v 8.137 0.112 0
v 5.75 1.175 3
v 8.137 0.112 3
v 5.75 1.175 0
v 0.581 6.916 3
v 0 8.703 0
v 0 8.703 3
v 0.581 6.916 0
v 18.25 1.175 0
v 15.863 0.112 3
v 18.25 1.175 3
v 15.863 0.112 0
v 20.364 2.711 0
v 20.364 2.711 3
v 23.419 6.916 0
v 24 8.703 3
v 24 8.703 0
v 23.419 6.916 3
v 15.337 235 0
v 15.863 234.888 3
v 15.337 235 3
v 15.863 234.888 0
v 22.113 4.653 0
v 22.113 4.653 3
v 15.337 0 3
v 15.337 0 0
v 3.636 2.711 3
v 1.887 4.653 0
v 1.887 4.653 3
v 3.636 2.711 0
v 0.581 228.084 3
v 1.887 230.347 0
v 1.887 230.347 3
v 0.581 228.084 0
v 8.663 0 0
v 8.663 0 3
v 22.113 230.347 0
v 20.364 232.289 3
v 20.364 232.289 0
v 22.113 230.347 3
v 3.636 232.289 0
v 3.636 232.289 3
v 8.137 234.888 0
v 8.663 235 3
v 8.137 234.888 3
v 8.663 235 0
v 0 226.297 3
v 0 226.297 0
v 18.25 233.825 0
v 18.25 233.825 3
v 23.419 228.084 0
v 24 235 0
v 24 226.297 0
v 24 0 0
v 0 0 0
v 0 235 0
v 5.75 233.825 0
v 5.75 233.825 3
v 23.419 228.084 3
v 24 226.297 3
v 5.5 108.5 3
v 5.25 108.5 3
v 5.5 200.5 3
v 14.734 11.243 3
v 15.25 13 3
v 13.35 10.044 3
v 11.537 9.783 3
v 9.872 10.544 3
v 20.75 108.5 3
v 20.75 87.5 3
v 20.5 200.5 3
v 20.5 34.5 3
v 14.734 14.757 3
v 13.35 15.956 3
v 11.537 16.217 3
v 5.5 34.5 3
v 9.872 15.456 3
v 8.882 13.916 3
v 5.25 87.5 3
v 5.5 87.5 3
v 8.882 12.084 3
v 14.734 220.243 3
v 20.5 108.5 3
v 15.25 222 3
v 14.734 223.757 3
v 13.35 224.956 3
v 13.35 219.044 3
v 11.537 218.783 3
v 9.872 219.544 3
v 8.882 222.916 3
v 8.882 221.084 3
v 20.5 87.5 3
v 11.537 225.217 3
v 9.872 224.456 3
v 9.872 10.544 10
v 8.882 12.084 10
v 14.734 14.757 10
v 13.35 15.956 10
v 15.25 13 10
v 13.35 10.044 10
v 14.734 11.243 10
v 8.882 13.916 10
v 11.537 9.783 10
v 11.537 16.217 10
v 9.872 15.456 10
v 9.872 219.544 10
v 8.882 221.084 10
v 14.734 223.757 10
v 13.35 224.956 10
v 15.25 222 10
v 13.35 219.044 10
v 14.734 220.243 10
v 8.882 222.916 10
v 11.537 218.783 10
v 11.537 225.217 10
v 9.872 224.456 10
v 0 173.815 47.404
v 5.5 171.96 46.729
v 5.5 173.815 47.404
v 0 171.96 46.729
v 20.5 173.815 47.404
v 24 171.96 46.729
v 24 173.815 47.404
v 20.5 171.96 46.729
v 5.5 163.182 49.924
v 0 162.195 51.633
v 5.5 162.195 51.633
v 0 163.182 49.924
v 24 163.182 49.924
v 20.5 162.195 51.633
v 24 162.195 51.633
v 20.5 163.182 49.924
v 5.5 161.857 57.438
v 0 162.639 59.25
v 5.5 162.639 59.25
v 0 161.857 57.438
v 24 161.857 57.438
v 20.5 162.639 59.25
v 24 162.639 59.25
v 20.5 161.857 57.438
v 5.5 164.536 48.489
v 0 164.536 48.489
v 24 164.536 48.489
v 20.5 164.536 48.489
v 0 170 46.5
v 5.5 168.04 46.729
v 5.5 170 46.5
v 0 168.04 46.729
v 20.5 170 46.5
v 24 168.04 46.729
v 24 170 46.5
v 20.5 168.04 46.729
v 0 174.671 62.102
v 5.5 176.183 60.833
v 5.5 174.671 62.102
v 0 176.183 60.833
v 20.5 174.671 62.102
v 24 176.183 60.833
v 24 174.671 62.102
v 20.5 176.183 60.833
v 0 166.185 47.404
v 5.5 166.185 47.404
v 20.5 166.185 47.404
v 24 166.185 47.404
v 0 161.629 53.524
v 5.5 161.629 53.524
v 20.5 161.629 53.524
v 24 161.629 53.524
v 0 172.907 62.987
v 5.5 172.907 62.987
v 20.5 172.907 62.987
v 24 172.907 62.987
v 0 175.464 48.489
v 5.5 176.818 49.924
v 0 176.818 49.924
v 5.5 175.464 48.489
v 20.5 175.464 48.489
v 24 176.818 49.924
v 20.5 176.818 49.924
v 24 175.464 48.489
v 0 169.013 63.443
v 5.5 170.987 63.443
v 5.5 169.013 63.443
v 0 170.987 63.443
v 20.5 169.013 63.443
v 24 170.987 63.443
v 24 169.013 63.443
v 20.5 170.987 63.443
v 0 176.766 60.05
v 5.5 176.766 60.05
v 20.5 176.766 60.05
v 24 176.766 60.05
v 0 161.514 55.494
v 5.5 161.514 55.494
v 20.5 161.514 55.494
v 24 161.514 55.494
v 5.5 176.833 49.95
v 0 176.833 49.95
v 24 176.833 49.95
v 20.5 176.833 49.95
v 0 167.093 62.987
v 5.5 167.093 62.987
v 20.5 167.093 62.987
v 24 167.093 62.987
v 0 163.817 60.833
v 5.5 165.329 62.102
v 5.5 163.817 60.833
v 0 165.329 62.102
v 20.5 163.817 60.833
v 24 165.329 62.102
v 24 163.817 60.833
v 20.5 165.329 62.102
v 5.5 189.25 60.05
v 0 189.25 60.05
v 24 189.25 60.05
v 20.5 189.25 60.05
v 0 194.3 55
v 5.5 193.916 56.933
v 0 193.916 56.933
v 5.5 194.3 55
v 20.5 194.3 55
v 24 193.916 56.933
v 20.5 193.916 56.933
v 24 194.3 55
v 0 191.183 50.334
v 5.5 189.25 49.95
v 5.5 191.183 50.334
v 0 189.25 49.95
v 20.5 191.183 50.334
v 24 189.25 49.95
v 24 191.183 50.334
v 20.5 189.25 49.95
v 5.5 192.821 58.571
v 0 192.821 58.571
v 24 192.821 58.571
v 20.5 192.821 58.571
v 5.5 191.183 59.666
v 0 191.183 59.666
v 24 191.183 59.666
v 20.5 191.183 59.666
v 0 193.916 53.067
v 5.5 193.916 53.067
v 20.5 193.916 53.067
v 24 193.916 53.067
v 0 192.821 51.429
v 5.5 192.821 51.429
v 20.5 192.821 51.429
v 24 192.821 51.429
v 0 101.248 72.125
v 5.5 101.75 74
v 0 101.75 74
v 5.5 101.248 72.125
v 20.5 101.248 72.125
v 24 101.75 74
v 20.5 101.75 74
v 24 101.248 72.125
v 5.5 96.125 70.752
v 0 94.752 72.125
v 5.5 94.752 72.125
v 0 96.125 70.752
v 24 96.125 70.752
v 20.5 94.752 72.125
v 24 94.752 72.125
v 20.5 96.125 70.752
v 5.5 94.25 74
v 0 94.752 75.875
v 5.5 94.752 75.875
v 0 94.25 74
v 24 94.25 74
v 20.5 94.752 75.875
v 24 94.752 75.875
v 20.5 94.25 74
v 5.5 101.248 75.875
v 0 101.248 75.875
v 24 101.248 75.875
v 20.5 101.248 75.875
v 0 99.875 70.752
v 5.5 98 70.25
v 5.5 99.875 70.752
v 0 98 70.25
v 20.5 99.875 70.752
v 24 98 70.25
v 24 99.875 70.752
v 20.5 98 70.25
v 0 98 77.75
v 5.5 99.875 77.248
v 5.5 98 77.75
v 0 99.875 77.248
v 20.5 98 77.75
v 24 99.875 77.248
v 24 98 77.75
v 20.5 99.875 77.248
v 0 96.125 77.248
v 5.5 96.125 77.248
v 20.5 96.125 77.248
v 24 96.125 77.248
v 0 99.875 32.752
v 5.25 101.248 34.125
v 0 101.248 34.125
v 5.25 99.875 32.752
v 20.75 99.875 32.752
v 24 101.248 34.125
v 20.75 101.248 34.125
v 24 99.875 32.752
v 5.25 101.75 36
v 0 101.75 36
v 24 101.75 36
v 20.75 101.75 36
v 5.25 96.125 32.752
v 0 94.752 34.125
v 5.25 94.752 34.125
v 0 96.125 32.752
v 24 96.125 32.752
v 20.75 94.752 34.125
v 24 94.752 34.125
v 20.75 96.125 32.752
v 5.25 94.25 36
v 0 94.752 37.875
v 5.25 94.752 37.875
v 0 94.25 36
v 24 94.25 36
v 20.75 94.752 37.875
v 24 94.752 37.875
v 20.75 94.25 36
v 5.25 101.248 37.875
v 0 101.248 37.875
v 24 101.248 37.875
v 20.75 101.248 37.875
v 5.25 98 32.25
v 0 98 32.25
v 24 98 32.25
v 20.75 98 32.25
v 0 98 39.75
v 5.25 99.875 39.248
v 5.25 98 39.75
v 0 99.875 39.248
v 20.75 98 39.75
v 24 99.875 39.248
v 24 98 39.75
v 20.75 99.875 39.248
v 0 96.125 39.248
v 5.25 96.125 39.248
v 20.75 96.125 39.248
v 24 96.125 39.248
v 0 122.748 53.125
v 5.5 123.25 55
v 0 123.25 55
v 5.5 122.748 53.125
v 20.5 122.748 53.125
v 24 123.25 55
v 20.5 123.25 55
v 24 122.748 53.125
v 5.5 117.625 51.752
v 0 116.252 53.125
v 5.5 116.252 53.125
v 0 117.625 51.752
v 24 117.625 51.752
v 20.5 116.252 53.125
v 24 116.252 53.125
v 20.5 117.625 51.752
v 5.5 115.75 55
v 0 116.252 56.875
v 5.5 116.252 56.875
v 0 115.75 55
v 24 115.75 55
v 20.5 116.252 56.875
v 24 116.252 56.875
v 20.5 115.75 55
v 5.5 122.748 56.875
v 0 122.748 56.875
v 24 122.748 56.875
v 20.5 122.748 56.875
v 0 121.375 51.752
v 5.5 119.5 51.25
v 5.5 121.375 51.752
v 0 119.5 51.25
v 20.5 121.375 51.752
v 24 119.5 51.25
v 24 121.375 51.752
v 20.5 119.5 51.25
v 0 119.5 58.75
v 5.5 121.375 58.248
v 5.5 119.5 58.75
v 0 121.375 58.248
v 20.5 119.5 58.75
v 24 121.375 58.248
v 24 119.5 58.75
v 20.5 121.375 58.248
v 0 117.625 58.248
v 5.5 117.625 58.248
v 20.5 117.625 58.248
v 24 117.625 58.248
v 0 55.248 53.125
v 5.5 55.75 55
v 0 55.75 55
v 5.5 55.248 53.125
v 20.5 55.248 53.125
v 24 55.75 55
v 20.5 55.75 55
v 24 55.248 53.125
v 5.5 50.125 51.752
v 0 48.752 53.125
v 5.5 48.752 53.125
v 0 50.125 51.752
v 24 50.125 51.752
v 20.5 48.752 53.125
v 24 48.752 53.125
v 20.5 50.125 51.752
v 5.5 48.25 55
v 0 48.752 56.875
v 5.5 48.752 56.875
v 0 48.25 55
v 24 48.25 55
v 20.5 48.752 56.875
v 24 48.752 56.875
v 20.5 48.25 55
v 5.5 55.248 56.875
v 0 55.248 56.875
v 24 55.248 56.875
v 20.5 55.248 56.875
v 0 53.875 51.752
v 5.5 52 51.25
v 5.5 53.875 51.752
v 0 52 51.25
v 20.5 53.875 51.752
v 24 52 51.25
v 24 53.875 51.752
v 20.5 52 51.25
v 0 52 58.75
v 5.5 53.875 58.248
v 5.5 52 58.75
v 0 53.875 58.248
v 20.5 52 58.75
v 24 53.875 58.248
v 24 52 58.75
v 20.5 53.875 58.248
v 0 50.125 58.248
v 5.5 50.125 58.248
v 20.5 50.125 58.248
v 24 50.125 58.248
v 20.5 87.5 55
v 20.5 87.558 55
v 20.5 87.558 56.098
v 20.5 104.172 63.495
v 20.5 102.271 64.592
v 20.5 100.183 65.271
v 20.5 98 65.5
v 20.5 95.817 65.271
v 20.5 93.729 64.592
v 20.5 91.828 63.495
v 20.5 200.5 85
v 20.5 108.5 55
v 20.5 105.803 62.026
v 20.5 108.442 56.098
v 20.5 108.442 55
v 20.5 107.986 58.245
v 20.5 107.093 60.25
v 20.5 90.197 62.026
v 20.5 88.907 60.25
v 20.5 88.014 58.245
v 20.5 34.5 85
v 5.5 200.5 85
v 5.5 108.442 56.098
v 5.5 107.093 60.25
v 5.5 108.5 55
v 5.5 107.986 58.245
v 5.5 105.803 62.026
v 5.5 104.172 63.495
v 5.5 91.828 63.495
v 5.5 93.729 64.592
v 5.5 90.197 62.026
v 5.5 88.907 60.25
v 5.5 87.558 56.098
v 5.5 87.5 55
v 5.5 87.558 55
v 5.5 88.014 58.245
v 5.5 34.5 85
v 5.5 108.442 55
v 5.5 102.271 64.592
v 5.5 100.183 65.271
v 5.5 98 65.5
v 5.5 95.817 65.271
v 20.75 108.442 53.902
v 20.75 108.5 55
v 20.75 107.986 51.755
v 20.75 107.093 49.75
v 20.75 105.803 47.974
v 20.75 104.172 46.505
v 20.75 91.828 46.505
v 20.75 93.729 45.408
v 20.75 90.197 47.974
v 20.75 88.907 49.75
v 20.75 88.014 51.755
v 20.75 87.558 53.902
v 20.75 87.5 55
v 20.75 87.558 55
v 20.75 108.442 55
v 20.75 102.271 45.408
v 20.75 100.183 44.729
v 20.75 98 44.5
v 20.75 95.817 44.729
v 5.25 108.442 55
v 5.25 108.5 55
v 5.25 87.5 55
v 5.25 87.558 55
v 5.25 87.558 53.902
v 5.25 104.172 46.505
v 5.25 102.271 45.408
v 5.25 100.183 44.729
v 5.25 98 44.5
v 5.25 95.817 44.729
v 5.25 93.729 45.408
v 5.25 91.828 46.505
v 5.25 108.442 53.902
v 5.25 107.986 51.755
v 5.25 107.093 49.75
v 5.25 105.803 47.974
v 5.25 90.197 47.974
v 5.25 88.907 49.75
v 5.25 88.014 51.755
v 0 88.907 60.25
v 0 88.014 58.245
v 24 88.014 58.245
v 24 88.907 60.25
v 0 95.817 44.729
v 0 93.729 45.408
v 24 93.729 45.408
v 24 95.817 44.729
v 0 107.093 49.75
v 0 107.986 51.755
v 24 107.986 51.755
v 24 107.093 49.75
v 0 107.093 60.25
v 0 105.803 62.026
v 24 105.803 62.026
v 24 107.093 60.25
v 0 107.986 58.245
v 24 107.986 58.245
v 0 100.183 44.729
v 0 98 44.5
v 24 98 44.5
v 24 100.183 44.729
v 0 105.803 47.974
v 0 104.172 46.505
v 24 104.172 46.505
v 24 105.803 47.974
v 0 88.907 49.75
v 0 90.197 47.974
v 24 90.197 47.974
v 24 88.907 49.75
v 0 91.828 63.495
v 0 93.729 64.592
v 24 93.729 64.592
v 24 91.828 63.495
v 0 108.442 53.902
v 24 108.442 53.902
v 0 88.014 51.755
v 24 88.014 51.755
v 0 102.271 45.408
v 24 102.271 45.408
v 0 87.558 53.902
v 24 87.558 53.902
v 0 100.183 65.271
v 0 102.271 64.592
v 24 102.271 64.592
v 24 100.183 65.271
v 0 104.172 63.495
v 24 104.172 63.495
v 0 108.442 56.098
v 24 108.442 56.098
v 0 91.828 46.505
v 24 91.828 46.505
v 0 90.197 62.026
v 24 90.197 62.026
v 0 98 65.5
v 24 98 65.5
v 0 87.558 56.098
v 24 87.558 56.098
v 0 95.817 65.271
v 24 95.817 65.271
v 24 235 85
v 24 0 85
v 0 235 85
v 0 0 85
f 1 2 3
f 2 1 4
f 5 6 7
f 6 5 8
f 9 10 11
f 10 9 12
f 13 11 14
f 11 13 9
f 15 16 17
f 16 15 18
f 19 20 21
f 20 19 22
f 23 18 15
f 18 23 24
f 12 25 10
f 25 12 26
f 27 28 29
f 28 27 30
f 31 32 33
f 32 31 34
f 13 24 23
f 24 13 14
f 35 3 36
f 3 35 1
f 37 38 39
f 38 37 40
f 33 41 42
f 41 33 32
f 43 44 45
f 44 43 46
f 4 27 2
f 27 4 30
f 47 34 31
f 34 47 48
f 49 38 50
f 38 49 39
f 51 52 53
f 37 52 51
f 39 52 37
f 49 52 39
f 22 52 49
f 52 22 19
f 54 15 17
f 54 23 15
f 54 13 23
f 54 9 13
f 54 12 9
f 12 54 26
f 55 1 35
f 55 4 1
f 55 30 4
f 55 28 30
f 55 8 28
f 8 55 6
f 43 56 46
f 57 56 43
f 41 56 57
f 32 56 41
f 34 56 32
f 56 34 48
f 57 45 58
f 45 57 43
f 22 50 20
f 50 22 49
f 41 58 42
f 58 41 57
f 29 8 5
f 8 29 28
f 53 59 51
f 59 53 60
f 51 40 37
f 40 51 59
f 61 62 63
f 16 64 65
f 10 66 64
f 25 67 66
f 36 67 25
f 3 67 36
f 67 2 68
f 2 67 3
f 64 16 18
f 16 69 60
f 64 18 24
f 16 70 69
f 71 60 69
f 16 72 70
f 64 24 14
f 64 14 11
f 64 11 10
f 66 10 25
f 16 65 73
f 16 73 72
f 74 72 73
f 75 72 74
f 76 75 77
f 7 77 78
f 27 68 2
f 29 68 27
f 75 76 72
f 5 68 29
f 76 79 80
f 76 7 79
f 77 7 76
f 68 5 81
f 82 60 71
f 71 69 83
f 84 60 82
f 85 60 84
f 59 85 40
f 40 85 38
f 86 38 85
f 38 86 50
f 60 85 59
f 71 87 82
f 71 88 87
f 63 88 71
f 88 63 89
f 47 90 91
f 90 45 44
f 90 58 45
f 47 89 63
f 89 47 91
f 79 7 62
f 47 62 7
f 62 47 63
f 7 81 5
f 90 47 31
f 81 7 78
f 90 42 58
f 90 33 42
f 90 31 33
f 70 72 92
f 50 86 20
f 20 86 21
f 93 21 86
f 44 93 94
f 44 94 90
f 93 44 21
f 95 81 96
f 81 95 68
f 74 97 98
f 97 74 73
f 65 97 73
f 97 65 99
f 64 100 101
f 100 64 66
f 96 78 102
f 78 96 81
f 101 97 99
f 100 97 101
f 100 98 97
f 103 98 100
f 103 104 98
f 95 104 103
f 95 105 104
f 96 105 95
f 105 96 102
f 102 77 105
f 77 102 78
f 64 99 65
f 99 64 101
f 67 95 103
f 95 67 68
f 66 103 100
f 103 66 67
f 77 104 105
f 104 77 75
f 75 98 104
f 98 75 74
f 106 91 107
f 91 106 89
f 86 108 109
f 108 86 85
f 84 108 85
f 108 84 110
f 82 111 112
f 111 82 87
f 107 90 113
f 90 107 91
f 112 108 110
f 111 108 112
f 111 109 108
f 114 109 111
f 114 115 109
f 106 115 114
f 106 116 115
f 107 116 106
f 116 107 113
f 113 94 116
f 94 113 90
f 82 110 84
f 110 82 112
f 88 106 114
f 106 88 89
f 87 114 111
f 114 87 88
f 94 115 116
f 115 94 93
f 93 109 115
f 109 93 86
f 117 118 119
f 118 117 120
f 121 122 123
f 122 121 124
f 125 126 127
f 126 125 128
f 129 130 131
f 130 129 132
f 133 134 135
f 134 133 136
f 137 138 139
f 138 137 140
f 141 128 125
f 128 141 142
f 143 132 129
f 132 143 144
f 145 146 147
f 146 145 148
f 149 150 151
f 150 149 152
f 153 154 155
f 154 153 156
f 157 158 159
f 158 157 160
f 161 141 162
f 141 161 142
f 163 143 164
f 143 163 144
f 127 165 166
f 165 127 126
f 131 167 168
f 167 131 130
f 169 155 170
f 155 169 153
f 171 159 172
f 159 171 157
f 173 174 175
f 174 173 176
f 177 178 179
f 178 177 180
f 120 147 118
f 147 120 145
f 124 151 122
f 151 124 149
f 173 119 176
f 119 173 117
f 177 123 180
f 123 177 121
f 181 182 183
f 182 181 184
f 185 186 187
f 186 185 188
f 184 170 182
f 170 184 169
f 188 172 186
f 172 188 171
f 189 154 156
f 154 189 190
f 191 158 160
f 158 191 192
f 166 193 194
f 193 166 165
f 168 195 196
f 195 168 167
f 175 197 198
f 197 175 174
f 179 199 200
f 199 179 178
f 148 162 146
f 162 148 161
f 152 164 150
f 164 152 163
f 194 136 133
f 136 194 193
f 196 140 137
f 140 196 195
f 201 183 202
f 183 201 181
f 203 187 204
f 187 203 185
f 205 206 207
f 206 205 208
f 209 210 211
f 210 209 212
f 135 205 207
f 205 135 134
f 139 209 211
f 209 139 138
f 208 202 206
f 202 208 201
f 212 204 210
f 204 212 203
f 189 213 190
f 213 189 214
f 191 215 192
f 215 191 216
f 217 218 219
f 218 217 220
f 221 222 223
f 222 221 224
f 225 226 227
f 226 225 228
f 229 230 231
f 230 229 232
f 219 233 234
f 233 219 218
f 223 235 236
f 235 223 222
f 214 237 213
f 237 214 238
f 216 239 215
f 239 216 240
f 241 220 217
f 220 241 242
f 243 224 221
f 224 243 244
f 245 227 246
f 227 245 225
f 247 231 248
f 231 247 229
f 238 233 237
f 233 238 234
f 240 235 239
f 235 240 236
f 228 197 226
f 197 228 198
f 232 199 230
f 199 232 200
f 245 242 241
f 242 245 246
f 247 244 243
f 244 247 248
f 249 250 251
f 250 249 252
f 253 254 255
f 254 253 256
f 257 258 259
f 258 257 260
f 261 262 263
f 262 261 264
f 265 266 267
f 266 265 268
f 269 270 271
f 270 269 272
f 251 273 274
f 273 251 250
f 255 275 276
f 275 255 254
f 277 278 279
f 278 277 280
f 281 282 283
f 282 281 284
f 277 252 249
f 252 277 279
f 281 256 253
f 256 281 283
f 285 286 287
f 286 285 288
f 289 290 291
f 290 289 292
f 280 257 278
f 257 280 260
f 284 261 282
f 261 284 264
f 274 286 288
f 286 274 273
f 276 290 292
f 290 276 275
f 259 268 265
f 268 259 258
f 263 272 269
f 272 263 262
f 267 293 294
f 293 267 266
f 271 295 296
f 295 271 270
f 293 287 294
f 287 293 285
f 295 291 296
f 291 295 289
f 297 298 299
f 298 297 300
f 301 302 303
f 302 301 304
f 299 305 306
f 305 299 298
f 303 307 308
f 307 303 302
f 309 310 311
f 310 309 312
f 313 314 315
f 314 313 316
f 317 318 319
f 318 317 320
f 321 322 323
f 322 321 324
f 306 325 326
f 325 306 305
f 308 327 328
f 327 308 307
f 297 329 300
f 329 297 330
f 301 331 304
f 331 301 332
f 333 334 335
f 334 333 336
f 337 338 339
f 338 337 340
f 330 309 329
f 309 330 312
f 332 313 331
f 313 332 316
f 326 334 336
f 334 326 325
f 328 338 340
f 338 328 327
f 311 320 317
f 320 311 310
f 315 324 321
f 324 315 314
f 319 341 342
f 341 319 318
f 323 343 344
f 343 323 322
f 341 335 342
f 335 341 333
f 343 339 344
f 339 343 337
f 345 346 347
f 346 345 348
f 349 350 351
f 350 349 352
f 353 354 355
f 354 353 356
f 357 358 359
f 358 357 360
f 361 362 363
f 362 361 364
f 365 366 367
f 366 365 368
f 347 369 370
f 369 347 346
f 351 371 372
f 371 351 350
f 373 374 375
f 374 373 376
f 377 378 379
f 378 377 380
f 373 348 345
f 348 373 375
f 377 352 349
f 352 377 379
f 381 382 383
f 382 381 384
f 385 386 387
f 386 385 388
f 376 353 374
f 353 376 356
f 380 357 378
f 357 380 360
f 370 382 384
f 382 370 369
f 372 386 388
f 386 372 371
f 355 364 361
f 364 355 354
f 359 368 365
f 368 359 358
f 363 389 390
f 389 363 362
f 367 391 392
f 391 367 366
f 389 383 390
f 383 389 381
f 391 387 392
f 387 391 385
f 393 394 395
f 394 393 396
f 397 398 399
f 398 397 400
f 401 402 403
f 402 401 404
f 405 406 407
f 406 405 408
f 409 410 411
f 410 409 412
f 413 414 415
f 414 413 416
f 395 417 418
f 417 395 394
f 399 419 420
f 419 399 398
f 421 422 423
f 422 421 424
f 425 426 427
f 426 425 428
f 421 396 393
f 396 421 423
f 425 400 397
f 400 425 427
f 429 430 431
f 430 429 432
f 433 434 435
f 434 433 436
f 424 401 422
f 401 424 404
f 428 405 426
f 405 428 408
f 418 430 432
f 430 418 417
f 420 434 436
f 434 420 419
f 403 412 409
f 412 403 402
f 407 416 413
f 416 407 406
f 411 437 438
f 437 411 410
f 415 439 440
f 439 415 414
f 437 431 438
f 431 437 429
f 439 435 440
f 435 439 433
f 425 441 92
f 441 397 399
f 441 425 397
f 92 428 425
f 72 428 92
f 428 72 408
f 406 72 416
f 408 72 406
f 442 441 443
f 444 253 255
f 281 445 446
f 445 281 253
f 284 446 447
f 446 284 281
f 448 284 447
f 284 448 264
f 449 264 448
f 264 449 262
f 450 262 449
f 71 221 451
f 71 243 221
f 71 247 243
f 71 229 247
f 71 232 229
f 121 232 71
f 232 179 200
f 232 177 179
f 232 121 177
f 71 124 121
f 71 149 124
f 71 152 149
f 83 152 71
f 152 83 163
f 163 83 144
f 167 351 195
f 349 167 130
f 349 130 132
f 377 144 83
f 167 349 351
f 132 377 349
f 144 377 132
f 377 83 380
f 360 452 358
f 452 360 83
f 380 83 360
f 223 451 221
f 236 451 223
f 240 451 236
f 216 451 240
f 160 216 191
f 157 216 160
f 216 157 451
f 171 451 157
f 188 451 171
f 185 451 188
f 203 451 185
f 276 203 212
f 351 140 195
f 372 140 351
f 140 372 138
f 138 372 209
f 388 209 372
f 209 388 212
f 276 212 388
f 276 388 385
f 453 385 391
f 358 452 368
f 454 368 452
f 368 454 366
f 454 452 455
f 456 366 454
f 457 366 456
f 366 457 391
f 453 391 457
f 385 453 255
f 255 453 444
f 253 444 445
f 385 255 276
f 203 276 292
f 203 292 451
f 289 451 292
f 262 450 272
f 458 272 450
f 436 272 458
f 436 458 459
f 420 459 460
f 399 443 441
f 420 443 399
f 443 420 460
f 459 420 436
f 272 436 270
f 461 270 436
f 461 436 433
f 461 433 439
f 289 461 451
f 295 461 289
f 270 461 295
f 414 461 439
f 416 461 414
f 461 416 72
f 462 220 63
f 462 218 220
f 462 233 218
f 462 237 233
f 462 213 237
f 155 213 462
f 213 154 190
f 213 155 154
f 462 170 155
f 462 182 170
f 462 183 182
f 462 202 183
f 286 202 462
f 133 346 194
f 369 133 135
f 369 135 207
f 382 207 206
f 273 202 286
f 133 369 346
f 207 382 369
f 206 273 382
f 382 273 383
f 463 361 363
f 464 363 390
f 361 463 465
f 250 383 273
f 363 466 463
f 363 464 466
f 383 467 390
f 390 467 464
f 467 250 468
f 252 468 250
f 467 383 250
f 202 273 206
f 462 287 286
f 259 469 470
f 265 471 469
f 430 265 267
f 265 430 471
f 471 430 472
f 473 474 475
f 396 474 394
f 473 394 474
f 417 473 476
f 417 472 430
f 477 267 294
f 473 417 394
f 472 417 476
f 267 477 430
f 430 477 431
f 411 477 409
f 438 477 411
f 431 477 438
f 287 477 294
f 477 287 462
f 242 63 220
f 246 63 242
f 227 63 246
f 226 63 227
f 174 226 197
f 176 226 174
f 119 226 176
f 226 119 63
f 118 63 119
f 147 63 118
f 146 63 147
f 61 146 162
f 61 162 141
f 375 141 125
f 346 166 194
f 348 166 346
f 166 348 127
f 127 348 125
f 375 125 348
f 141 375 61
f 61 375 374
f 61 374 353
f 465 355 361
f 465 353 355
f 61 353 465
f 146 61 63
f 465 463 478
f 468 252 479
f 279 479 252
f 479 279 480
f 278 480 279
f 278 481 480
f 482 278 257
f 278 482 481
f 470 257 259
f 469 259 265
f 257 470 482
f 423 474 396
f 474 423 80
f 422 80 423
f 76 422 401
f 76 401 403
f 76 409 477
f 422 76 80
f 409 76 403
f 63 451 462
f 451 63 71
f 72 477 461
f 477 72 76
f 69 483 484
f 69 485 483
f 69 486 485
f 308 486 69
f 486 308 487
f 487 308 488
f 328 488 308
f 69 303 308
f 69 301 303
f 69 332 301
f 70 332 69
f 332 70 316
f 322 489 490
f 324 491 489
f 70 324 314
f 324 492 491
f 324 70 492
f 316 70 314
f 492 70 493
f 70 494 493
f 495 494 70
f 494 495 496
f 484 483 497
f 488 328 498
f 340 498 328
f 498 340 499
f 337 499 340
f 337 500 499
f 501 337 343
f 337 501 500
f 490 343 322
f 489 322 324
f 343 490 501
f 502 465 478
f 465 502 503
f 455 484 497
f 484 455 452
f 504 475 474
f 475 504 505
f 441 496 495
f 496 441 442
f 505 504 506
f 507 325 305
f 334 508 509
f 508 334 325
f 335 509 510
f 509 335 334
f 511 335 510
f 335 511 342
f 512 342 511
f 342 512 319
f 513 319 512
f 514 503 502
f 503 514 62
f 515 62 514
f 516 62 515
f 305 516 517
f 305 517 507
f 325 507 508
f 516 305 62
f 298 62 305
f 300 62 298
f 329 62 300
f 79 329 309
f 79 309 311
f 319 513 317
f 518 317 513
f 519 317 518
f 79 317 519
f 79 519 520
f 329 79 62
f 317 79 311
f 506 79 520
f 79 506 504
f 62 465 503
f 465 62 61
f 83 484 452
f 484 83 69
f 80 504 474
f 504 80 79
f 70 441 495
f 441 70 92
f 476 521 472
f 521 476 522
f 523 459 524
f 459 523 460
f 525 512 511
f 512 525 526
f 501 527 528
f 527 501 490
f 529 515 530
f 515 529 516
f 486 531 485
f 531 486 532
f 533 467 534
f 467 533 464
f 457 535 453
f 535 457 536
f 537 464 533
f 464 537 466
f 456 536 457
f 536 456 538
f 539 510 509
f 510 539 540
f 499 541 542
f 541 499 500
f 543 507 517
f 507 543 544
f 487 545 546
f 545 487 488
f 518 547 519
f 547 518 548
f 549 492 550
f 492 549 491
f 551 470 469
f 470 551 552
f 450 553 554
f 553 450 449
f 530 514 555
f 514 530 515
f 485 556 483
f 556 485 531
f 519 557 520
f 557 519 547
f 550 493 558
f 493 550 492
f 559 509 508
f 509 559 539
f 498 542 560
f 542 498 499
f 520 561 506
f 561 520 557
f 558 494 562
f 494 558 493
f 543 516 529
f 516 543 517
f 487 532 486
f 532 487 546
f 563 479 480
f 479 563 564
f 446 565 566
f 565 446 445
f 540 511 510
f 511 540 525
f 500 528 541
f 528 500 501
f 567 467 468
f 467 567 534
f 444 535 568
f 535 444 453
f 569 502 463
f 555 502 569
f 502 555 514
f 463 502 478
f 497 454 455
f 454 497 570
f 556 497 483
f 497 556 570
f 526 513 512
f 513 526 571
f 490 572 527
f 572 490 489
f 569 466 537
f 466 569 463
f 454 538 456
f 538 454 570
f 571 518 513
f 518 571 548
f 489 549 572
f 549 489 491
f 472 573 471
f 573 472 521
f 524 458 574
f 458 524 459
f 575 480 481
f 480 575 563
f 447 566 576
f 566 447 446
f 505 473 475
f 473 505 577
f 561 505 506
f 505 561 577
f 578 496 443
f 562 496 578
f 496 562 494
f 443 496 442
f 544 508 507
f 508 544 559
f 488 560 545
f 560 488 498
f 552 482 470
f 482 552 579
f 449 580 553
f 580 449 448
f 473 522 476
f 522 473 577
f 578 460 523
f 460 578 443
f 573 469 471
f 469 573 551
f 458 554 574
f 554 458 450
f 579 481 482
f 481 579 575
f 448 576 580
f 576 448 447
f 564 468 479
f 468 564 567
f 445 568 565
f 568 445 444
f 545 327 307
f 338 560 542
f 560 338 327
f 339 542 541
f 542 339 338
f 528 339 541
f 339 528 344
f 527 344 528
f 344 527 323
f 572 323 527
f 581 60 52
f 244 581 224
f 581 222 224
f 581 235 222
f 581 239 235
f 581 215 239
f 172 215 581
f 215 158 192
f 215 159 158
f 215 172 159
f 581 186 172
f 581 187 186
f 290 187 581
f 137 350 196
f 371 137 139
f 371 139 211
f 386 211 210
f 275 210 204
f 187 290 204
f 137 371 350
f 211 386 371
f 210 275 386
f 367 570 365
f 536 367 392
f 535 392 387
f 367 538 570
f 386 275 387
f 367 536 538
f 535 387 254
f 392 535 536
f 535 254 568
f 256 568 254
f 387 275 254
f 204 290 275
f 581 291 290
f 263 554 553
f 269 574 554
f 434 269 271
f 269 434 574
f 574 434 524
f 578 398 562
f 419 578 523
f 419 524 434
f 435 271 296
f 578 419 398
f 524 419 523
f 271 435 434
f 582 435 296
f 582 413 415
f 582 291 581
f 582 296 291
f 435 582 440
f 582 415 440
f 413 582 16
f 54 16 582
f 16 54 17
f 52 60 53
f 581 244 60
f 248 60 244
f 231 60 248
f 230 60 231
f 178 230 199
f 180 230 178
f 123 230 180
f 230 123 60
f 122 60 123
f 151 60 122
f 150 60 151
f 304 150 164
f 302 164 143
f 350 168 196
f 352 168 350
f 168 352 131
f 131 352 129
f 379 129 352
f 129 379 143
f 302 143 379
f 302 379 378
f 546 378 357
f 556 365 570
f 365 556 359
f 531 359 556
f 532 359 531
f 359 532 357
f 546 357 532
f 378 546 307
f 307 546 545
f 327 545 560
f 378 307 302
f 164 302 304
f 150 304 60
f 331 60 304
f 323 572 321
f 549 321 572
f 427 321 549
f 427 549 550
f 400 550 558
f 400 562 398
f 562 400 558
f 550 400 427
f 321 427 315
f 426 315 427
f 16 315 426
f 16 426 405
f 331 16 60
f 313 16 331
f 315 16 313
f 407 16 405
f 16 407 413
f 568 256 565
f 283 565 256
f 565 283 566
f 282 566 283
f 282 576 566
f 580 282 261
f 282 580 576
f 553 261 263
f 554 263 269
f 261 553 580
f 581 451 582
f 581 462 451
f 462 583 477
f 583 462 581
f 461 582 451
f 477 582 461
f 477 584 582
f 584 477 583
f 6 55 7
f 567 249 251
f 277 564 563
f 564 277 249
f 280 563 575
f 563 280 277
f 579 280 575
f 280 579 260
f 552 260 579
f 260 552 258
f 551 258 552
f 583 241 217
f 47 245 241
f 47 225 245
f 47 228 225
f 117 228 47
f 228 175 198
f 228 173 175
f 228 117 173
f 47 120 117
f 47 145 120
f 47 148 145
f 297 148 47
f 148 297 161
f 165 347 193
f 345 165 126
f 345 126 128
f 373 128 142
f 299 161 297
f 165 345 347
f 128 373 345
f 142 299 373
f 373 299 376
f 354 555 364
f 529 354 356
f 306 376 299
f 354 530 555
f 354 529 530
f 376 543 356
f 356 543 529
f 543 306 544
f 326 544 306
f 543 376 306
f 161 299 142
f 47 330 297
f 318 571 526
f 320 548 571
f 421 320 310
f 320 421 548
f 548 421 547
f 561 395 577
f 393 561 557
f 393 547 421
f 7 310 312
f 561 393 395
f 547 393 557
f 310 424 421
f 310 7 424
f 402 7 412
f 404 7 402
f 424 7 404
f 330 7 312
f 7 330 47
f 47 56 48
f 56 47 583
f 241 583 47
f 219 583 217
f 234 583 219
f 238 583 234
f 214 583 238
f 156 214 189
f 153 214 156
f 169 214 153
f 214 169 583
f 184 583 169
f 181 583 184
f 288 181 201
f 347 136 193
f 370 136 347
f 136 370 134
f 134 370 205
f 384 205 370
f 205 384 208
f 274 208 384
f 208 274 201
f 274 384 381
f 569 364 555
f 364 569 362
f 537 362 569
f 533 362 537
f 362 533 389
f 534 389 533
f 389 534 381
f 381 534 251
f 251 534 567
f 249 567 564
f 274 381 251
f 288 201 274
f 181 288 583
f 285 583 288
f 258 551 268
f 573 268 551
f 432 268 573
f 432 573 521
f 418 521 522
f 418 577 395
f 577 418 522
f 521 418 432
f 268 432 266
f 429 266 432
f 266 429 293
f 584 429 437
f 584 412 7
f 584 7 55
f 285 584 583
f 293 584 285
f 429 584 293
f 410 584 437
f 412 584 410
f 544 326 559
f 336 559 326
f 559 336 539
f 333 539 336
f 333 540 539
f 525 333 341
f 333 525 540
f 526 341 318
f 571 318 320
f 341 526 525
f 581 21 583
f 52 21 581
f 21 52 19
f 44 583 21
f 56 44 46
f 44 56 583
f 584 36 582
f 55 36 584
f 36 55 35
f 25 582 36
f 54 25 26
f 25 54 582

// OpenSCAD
blendenlaenge=235;
blendendicke=24;
lochabstandzueinander=209;
lochabstandoben=13;
lochdicke=6.5;
blechdicke=3;
kassettenabstandhinten=4;
kassettendicke=14;
kassettenhoehe=165;
kassettenbreite=85;
kassettenabstandoben=35;
dornmass=55;
klinkeoben=98;
klinkeschloss=72;
horizontalerhaltelochabstand=38;
horizontalbisklinke=38/2;
mittlereshaltelochbisklinke=21.5;
obereshaltelochbisklinke=46;
montagelochdurchmesser=7.5;
klinkedurchmesser=21;
klinkepfadhoehe=15.5;
rechts=true;
montagespiel=1;
montageloecher=[
  [0,klinkeoben,dornmass+horizontalbisklinke],
  [0,klinkeoben,dornmass-horizontalbisklinke],
  [0,klinkeoben+mittlereshaltelochbisklinke,dornmass],
  [0,klinkeoben-obereshaltelochbisklinke,dornmass]
];

module blech(){
  union(){
    translate([0,blendendicke/2])hull(){
      cylinder(d=blendendicke+montagespiel,h=blechdicke);
      translate([0,blendenlaenge-blendendicke]){
        cylinder(d=blendendicke+montagespiel,h=blechdicke);
      }
    };
    translate([0,lochabstandoben])cylinder(d=lochdicke,h=10);
    translate([0,lochabstandoben+lochabstandzueinander])cylinder(d=lochdicke,h=10);
  };
}


module kassette(){
  translate([-montagespiel/2,-montagespiel/2])cube([kassettendicke+montagespiel,kassettenhoehe+montagespiel,kassettenbreite+montagespiel]);  
}

module schliesszylinder(h = 10){
	length = 33.5;
	slotwidth = 10.5;
	keycylinderwidth = 17;
	cylinder(d=keycylinderwidth,h);
	hull(){
		translate([0,33-slotwidth/2 -keycylinderwidth / 2,0]){cylinder(d=10.1,h);}
		cylinder(d=10.1,h);
	}
}

module kassettenaussparung(rechts=true,dornmass=55){
  translate([blendendicke/2,0])blech();
  translate([-40,klinkeoben+klinkeschloss,dornmass])rotate([0,90,0])schliesszylinder(h=100);
  //klinke
  translate([-40,klinkeoben,dornmass])rotate([0,90,0])cylinder(h=100,d=klinkedurchmesser);

  //montageloecher
  for(point = montageloecher){
    translate([-40,0,0]+point)rotate([0,90,0])cylinder(h=100,d=montagelochdurchmesser);
  }

  if(rechts){
    rechterAbstand=blendendicke-kassettenabstandhinten-kassettendicke;
    klinkenpfadoffset=rechterAbstand-(klinkepfadhoehe-kassettendicke)/2;
    translate([rechterAbstand,kassettenabstandoben])kassette();
    translate([klinkenpfadoffset,klinkeoben-klinkedurchmesser/2,0])cube([klinkepfadhoehe,klinkedurchmesser,dornmass]);
  } else{
    klinkenpfadoffset=kassettenabstandhinten-(klinkepfadhoehe-kassettendicke)/2;
    translate([kassettenabstandhinten,kassettenabstandoben])kassette();
    translate([klinkenpfadoffset,klinkeoben-klinkedurchmesser/2,0])cube([klinkepfadhoehe,klinkedurchmesser,dornmass]);
  }
}
difference(){
  cube([blendendicke,blendenlaenge,kassettenbreite]);
  kassettenaussparung();
}
